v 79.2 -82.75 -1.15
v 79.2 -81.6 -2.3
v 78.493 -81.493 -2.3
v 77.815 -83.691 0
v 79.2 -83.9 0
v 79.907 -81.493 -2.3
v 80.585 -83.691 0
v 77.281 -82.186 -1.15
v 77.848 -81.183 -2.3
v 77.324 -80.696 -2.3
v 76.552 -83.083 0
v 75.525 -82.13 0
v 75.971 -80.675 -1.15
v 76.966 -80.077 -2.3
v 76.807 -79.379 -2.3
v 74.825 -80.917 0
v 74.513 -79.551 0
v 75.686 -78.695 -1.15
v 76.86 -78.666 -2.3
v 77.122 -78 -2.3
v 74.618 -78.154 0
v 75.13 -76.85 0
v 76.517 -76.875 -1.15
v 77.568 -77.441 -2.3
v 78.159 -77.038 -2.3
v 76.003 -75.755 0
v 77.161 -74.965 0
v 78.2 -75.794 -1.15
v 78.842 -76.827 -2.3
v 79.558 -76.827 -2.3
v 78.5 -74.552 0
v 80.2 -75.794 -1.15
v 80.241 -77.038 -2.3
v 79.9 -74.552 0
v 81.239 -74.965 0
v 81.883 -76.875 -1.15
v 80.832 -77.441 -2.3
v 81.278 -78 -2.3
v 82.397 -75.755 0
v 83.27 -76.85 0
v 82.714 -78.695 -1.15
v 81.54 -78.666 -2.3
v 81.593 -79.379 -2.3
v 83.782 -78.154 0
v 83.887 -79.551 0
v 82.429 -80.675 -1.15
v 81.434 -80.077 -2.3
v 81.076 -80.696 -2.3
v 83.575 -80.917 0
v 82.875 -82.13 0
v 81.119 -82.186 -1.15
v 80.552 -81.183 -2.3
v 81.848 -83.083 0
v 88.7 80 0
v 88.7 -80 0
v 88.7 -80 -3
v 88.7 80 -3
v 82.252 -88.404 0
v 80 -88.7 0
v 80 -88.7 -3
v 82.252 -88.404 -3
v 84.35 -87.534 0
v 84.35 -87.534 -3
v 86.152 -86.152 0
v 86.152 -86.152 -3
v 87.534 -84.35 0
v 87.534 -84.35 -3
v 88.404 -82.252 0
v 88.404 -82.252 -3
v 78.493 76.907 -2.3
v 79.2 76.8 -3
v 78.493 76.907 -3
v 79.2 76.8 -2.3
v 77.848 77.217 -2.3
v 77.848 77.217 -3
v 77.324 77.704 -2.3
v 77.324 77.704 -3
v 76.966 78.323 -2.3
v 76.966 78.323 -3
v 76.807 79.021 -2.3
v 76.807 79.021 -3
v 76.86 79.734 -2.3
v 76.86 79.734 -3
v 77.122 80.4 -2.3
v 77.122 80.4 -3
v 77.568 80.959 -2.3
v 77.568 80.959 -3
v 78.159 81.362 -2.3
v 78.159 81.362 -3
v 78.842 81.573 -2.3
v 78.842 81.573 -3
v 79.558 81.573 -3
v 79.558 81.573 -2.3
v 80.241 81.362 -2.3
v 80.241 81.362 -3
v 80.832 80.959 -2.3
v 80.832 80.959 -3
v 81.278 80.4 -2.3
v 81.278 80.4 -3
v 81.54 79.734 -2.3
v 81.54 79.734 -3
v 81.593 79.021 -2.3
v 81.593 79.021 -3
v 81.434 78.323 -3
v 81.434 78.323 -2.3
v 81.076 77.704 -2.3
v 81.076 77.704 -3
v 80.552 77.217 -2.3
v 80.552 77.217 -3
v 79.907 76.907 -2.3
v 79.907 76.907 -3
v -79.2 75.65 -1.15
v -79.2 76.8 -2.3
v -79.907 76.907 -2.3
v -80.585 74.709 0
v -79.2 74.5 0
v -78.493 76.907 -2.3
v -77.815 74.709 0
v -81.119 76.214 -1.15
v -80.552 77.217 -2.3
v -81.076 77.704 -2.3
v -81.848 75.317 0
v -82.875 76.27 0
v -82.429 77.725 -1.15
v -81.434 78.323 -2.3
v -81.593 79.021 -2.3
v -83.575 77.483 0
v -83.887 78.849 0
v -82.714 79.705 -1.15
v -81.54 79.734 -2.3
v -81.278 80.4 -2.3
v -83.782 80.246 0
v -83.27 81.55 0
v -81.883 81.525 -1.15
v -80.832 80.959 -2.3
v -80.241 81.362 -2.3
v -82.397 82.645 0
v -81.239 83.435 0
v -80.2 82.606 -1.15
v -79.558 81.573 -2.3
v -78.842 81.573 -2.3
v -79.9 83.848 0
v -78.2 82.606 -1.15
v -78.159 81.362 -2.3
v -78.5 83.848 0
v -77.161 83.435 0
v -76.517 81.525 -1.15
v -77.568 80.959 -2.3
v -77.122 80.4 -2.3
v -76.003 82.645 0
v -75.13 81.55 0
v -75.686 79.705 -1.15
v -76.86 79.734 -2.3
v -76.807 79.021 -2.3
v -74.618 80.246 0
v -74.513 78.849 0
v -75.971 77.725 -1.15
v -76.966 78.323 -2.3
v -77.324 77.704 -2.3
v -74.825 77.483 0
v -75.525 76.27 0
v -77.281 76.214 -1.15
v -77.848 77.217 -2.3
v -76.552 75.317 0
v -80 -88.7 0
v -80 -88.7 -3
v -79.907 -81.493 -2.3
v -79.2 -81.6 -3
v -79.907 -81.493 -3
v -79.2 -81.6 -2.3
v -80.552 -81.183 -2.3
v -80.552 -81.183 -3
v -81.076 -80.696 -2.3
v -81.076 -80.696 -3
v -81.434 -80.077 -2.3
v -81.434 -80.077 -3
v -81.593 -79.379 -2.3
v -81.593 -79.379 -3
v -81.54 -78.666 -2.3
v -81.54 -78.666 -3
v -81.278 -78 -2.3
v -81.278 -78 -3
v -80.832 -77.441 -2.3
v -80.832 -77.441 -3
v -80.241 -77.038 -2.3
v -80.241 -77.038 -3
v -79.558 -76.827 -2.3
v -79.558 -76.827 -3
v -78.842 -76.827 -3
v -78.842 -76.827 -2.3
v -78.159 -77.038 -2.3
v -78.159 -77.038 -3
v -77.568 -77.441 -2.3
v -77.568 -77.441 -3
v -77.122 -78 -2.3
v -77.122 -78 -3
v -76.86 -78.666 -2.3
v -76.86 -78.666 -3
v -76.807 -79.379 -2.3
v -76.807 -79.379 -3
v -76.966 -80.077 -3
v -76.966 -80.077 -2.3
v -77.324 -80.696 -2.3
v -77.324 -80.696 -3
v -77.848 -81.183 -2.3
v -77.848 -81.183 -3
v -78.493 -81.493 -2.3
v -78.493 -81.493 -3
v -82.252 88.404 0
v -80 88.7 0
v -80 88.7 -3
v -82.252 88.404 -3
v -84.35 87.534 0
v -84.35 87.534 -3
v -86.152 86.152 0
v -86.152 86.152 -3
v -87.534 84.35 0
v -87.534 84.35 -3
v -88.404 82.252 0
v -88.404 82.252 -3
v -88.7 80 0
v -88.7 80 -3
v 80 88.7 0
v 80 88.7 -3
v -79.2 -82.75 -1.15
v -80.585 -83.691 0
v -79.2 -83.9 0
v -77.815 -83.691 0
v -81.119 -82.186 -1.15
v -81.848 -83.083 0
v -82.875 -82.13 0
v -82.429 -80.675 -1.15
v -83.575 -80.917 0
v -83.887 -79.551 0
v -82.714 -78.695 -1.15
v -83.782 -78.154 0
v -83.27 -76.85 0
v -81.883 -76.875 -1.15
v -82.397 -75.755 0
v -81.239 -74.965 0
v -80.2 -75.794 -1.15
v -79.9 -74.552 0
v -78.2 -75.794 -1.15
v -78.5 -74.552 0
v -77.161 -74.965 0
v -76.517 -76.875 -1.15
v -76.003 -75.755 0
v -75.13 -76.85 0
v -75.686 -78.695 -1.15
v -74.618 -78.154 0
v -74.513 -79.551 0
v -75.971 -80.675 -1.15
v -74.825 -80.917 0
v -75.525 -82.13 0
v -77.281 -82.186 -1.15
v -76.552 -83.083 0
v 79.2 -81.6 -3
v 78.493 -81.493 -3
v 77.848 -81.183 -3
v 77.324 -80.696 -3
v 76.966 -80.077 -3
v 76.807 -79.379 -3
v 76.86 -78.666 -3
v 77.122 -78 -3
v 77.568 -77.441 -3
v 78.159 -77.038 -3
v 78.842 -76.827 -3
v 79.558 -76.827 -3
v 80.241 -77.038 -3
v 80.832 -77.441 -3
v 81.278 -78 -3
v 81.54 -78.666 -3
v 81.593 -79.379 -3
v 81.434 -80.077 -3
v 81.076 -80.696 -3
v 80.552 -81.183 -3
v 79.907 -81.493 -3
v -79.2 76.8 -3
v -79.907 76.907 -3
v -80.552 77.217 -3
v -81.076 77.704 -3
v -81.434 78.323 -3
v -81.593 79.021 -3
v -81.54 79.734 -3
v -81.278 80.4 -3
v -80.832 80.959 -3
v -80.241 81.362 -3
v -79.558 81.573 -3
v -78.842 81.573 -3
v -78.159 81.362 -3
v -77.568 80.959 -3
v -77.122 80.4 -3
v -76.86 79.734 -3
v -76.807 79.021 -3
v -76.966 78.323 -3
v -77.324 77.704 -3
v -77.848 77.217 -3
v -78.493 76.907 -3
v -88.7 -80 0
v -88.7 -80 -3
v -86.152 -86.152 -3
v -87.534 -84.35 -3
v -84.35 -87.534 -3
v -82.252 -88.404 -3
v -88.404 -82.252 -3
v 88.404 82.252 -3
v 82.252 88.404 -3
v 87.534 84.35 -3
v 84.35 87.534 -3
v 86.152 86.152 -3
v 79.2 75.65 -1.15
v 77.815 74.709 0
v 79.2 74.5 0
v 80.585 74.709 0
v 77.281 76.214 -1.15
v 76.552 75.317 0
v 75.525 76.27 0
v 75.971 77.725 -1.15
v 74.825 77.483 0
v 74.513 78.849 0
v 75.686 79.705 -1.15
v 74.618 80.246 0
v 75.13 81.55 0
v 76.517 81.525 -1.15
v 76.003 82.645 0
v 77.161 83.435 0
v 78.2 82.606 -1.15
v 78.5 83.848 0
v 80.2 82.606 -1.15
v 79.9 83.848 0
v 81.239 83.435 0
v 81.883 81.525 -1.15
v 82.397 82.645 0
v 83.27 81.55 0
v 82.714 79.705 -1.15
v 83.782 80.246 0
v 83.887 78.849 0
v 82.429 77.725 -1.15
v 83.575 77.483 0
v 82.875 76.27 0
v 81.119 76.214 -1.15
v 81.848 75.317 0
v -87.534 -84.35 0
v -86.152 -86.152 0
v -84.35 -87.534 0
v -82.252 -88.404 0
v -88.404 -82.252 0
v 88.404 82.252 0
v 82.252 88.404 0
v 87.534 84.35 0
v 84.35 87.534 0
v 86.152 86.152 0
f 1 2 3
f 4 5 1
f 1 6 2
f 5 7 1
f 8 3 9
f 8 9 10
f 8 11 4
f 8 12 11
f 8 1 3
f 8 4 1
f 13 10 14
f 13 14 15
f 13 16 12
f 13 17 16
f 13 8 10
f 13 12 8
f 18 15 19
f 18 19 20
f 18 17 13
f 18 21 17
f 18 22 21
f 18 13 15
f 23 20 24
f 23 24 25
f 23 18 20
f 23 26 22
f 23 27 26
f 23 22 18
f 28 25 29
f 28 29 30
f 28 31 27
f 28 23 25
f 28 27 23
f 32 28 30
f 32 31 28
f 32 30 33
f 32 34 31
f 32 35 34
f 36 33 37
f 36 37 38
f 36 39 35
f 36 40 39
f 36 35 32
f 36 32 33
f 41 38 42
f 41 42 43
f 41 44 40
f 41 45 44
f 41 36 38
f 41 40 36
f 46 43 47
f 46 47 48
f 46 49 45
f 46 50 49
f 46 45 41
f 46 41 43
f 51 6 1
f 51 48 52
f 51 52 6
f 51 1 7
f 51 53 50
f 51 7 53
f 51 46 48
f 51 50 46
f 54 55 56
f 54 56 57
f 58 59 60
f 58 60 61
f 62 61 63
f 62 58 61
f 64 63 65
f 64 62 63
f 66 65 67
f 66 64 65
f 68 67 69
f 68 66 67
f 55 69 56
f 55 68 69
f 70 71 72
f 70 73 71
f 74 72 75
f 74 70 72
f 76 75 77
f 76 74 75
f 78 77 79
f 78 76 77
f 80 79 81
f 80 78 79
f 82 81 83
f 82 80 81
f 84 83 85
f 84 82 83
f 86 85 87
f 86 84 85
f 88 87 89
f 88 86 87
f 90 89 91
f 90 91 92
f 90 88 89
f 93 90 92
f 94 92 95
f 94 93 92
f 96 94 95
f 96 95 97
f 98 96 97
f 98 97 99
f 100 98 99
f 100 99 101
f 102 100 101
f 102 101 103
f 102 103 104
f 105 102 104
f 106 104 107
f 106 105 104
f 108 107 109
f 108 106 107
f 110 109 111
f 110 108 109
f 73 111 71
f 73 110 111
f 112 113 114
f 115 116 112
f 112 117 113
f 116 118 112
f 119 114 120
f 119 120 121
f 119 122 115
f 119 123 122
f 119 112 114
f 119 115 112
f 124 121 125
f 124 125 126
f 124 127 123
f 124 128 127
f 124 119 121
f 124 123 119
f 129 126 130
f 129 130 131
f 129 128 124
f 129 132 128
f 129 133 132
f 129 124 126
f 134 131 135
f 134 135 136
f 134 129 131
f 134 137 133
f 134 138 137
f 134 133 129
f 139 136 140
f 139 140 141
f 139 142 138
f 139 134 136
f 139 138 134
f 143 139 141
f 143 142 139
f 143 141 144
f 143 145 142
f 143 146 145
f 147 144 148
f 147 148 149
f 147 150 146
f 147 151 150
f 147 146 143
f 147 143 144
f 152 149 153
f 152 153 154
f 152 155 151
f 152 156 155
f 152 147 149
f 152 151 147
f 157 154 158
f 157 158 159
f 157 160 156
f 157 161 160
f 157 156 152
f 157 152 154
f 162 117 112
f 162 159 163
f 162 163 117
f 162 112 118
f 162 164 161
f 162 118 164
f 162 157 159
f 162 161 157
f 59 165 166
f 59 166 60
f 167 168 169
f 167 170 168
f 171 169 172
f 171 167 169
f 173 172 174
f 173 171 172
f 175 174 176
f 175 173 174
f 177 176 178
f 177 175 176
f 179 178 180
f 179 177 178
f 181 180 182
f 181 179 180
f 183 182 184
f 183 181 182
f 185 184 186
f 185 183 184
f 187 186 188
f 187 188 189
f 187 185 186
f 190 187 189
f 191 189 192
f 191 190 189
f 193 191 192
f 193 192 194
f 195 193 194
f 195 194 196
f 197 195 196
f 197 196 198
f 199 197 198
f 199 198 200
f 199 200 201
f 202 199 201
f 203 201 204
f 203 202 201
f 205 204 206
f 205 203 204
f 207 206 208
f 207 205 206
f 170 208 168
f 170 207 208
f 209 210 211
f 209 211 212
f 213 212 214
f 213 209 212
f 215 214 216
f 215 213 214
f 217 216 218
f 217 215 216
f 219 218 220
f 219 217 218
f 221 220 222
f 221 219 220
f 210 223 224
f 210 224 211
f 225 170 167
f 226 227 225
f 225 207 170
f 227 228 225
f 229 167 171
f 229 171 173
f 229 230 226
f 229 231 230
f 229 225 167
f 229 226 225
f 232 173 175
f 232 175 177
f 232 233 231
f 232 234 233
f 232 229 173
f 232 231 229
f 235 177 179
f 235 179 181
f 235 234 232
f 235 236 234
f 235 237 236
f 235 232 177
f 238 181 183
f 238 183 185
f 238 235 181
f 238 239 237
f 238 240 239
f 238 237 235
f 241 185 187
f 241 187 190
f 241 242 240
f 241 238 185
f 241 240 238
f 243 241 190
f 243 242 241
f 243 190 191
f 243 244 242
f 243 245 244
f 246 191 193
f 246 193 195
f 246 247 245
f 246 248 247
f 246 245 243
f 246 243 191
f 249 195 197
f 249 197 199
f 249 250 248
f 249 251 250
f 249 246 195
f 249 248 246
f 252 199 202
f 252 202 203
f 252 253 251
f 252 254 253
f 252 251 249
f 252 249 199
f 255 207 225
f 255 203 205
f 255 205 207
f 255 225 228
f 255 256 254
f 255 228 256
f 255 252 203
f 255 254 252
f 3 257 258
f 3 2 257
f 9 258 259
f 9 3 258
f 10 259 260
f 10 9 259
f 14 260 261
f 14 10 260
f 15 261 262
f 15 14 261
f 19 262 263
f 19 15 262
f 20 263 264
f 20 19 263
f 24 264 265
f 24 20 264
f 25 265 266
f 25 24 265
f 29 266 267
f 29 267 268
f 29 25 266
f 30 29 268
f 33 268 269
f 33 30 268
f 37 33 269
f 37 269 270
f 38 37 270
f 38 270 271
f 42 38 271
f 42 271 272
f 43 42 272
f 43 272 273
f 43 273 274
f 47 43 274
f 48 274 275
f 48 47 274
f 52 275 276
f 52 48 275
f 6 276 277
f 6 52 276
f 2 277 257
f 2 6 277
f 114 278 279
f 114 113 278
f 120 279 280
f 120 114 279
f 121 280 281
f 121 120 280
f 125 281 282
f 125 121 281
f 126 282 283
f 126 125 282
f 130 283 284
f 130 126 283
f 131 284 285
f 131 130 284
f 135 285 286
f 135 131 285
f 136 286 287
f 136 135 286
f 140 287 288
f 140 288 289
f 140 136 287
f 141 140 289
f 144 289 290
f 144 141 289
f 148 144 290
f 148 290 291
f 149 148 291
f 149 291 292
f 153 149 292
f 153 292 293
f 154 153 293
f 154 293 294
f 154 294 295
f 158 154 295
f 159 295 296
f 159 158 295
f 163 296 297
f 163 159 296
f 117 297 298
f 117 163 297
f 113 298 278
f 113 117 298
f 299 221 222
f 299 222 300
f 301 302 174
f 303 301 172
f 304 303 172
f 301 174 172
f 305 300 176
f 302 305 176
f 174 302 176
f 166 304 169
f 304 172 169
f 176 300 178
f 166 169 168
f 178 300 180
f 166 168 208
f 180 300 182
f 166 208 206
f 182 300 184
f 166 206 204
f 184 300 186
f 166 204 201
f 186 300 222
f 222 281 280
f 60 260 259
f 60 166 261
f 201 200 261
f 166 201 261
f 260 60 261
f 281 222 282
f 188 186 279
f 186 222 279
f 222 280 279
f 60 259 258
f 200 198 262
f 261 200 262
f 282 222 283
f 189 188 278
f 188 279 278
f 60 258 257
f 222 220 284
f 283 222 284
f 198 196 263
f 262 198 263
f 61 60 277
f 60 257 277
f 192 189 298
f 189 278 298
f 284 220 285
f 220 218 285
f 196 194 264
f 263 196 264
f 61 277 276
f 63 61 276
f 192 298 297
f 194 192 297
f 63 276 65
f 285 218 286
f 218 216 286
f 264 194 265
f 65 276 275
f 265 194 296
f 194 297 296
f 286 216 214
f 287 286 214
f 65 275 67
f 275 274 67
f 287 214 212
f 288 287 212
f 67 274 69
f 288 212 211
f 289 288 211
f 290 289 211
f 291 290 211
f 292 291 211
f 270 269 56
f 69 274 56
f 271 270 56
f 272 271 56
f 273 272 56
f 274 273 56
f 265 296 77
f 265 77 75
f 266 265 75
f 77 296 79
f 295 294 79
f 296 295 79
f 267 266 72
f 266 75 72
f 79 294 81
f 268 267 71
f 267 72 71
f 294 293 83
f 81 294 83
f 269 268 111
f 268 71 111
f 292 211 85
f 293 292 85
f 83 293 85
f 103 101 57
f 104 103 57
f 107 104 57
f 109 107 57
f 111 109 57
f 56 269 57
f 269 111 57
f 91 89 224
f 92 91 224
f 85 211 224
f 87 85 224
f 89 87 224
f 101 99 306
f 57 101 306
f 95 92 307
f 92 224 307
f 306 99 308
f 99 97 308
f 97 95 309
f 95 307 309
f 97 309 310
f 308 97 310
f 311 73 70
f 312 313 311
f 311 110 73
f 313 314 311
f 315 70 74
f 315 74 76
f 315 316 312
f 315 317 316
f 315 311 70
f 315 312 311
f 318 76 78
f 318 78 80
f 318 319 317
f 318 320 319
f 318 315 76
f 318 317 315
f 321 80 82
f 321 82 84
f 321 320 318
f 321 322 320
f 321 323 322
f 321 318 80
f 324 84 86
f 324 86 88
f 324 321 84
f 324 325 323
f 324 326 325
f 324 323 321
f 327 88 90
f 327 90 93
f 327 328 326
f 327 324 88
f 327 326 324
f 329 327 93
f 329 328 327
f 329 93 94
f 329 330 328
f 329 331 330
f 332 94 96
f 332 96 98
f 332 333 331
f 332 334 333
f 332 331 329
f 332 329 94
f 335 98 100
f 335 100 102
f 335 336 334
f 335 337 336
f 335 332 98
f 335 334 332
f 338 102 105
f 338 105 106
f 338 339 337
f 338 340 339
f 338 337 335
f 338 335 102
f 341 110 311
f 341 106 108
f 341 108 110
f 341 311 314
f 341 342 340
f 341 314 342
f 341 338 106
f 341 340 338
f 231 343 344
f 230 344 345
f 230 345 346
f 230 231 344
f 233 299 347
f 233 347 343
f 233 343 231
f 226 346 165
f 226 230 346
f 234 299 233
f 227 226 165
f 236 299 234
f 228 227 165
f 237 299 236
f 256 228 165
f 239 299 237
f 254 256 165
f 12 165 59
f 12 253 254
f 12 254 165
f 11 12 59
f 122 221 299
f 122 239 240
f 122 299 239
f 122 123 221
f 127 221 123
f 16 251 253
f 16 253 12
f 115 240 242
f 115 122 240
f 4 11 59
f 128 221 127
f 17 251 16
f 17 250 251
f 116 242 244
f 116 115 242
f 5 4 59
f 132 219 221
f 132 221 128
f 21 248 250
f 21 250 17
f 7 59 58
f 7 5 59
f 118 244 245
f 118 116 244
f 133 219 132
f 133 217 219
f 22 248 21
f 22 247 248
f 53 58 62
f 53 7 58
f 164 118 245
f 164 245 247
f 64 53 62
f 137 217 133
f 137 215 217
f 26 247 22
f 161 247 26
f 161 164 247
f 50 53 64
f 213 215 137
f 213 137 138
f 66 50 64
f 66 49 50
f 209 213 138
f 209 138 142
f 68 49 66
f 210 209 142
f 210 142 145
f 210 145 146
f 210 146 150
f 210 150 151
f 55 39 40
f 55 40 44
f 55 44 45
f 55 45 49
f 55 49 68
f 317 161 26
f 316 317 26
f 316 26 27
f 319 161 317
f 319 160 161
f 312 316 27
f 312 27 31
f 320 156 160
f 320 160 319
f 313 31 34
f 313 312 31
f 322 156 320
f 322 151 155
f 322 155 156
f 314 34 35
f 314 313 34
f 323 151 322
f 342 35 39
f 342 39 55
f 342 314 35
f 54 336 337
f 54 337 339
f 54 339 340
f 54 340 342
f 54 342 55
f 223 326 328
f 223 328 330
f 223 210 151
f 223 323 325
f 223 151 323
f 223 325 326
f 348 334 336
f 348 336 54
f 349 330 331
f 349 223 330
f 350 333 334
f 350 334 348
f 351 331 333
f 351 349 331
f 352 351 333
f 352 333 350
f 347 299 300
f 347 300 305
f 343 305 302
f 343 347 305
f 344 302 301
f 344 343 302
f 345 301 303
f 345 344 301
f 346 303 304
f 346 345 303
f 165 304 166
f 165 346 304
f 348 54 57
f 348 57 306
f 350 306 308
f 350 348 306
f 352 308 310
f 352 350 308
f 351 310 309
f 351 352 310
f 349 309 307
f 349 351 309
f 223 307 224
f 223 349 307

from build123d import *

# Parameters (mm, degrees)
BOSS_EXTRUDE1_DEPTH                            = 3
CSK_FOR_M4_FLAT_HEAD_MACHINE_SCREW1_AT_2_COUNT = 2
CSK_FOR_M4_FLAT_HEAD_MACHINE_SCREW1_AT_2_PITCH = 158.4
CSK_FOR_M4_FLAT_HEAD_MACHINE_SCREW1_AT_3_COUNT = 2
CSK_FOR_M4_FLAT_HEAD_MACHINE_SCREW1_AT_3_PITCH = 224.01142828
CSK_FOR_M4_FLAT_HEAD_MACHINE_SCREW1_AT_4_COUNT = 2
CSK_FOR_M4_FLAT_HEAD_MACHINE_SCREW1_AT_4_PITCH = 158.4


with BuildPart() as part:
    # Sketch1 → Boss-Extrude1 (new body)
    with BuildSketch(Plane.XY):
        with BuildLine():
            Line((-88.7, 80), (-88.7, -80))
            ThreePointArc((-88.7, -80), (-86.151828996, -86.151828996), (-80, -88.7))
            Line((-80, -88.7), (80, -88.7))
            ThreePointArc((80, -88.7), (86.151828996, -86.151828996), (88.7, -80))
            Line((88.7, -80), (88.7, 80))
            ThreePointArc((88.7, 80), (86.151828996, 86.151828996), (80, 88.7))
            Line((80, 88.7), (-80, 88.7))
            ThreePointArc((-80, 88.7), (-86.151828996, 86.151828996), (-88.7, 80))
        make_face()
    extrude(amount=-BOSS_EXTRUDE1_DEPTH)

    # Sketch3 → CSK for M4 Flat Head Machine Screw1 (revolve, cut)
    with BuildSketch(Plane(origin=(-79.2, 79.2, 0), x_dir=(0, -1, 0), z_dir=(1, 0, 0))):
        Polygon((0, 0), (0, 3), (2.4, 3), (2.4, 2.3), (4.7, 0), align=None)
    csk_for_m4_flat_head_machine_screw1 = revolve(axis=Axis((-79.2, 79.2, 6.35), (0, 0, -1)), mode=Mode.SUBTRACT)

    # CSK for M4 Flat Head Machine Screw1 at 2: CSK for M4 Flat Head Machine Screw1 ×2
    with Locations(*[(i * CSK_FOR_M4_FLAT_HEAD_MACHINE_SCREW1_AT_2_PITCH, 0, 0) for i in range(1, CSK_FOR_M4_FLAT_HEAD_MACHINE_SCREW1_AT_2_COUNT)]):
        add(csk_for_m4_flat_head_machine_screw1, mode=Mode.SUBTRACT)

    # CSK for M4 Flat Head Machine Screw1 at 3: CSK for M4 Flat Head Machine Screw1 ×2
    with Locations(*[Vector(0.707106781, -0.707106781, 0) * (i * CSK_FOR_M4_FLAT_HEAD_MACHINE_SCREW1_AT_3_PITCH) for i in range(1, CSK_FOR_M4_FLAT_HEAD_MACHINE_SCREW1_AT_3_COUNT)]):
        add(csk_for_m4_flat_head_machine_screw1, mode=Mode.SUBTRACT)

    # CSK for M4 Flat Head Machine Screw1 at 4: CSK for M4 Flat Head Machine Screw1 ×2
    with Locations(*[(0, -i * CSK_FOR_M4_FLAT_HEAD_MACHINE_SCREW1_AT_4_PITCH, 0) for i in range(1, CSK_FOR_M4_FLAT_HEAD_MACHINE_SCREW1_AT_4_COUNT)]):
        add(csk_for_m4_flat_head_machine_screw1, mode=Mode.SUBTRACT)


solid = part.part
